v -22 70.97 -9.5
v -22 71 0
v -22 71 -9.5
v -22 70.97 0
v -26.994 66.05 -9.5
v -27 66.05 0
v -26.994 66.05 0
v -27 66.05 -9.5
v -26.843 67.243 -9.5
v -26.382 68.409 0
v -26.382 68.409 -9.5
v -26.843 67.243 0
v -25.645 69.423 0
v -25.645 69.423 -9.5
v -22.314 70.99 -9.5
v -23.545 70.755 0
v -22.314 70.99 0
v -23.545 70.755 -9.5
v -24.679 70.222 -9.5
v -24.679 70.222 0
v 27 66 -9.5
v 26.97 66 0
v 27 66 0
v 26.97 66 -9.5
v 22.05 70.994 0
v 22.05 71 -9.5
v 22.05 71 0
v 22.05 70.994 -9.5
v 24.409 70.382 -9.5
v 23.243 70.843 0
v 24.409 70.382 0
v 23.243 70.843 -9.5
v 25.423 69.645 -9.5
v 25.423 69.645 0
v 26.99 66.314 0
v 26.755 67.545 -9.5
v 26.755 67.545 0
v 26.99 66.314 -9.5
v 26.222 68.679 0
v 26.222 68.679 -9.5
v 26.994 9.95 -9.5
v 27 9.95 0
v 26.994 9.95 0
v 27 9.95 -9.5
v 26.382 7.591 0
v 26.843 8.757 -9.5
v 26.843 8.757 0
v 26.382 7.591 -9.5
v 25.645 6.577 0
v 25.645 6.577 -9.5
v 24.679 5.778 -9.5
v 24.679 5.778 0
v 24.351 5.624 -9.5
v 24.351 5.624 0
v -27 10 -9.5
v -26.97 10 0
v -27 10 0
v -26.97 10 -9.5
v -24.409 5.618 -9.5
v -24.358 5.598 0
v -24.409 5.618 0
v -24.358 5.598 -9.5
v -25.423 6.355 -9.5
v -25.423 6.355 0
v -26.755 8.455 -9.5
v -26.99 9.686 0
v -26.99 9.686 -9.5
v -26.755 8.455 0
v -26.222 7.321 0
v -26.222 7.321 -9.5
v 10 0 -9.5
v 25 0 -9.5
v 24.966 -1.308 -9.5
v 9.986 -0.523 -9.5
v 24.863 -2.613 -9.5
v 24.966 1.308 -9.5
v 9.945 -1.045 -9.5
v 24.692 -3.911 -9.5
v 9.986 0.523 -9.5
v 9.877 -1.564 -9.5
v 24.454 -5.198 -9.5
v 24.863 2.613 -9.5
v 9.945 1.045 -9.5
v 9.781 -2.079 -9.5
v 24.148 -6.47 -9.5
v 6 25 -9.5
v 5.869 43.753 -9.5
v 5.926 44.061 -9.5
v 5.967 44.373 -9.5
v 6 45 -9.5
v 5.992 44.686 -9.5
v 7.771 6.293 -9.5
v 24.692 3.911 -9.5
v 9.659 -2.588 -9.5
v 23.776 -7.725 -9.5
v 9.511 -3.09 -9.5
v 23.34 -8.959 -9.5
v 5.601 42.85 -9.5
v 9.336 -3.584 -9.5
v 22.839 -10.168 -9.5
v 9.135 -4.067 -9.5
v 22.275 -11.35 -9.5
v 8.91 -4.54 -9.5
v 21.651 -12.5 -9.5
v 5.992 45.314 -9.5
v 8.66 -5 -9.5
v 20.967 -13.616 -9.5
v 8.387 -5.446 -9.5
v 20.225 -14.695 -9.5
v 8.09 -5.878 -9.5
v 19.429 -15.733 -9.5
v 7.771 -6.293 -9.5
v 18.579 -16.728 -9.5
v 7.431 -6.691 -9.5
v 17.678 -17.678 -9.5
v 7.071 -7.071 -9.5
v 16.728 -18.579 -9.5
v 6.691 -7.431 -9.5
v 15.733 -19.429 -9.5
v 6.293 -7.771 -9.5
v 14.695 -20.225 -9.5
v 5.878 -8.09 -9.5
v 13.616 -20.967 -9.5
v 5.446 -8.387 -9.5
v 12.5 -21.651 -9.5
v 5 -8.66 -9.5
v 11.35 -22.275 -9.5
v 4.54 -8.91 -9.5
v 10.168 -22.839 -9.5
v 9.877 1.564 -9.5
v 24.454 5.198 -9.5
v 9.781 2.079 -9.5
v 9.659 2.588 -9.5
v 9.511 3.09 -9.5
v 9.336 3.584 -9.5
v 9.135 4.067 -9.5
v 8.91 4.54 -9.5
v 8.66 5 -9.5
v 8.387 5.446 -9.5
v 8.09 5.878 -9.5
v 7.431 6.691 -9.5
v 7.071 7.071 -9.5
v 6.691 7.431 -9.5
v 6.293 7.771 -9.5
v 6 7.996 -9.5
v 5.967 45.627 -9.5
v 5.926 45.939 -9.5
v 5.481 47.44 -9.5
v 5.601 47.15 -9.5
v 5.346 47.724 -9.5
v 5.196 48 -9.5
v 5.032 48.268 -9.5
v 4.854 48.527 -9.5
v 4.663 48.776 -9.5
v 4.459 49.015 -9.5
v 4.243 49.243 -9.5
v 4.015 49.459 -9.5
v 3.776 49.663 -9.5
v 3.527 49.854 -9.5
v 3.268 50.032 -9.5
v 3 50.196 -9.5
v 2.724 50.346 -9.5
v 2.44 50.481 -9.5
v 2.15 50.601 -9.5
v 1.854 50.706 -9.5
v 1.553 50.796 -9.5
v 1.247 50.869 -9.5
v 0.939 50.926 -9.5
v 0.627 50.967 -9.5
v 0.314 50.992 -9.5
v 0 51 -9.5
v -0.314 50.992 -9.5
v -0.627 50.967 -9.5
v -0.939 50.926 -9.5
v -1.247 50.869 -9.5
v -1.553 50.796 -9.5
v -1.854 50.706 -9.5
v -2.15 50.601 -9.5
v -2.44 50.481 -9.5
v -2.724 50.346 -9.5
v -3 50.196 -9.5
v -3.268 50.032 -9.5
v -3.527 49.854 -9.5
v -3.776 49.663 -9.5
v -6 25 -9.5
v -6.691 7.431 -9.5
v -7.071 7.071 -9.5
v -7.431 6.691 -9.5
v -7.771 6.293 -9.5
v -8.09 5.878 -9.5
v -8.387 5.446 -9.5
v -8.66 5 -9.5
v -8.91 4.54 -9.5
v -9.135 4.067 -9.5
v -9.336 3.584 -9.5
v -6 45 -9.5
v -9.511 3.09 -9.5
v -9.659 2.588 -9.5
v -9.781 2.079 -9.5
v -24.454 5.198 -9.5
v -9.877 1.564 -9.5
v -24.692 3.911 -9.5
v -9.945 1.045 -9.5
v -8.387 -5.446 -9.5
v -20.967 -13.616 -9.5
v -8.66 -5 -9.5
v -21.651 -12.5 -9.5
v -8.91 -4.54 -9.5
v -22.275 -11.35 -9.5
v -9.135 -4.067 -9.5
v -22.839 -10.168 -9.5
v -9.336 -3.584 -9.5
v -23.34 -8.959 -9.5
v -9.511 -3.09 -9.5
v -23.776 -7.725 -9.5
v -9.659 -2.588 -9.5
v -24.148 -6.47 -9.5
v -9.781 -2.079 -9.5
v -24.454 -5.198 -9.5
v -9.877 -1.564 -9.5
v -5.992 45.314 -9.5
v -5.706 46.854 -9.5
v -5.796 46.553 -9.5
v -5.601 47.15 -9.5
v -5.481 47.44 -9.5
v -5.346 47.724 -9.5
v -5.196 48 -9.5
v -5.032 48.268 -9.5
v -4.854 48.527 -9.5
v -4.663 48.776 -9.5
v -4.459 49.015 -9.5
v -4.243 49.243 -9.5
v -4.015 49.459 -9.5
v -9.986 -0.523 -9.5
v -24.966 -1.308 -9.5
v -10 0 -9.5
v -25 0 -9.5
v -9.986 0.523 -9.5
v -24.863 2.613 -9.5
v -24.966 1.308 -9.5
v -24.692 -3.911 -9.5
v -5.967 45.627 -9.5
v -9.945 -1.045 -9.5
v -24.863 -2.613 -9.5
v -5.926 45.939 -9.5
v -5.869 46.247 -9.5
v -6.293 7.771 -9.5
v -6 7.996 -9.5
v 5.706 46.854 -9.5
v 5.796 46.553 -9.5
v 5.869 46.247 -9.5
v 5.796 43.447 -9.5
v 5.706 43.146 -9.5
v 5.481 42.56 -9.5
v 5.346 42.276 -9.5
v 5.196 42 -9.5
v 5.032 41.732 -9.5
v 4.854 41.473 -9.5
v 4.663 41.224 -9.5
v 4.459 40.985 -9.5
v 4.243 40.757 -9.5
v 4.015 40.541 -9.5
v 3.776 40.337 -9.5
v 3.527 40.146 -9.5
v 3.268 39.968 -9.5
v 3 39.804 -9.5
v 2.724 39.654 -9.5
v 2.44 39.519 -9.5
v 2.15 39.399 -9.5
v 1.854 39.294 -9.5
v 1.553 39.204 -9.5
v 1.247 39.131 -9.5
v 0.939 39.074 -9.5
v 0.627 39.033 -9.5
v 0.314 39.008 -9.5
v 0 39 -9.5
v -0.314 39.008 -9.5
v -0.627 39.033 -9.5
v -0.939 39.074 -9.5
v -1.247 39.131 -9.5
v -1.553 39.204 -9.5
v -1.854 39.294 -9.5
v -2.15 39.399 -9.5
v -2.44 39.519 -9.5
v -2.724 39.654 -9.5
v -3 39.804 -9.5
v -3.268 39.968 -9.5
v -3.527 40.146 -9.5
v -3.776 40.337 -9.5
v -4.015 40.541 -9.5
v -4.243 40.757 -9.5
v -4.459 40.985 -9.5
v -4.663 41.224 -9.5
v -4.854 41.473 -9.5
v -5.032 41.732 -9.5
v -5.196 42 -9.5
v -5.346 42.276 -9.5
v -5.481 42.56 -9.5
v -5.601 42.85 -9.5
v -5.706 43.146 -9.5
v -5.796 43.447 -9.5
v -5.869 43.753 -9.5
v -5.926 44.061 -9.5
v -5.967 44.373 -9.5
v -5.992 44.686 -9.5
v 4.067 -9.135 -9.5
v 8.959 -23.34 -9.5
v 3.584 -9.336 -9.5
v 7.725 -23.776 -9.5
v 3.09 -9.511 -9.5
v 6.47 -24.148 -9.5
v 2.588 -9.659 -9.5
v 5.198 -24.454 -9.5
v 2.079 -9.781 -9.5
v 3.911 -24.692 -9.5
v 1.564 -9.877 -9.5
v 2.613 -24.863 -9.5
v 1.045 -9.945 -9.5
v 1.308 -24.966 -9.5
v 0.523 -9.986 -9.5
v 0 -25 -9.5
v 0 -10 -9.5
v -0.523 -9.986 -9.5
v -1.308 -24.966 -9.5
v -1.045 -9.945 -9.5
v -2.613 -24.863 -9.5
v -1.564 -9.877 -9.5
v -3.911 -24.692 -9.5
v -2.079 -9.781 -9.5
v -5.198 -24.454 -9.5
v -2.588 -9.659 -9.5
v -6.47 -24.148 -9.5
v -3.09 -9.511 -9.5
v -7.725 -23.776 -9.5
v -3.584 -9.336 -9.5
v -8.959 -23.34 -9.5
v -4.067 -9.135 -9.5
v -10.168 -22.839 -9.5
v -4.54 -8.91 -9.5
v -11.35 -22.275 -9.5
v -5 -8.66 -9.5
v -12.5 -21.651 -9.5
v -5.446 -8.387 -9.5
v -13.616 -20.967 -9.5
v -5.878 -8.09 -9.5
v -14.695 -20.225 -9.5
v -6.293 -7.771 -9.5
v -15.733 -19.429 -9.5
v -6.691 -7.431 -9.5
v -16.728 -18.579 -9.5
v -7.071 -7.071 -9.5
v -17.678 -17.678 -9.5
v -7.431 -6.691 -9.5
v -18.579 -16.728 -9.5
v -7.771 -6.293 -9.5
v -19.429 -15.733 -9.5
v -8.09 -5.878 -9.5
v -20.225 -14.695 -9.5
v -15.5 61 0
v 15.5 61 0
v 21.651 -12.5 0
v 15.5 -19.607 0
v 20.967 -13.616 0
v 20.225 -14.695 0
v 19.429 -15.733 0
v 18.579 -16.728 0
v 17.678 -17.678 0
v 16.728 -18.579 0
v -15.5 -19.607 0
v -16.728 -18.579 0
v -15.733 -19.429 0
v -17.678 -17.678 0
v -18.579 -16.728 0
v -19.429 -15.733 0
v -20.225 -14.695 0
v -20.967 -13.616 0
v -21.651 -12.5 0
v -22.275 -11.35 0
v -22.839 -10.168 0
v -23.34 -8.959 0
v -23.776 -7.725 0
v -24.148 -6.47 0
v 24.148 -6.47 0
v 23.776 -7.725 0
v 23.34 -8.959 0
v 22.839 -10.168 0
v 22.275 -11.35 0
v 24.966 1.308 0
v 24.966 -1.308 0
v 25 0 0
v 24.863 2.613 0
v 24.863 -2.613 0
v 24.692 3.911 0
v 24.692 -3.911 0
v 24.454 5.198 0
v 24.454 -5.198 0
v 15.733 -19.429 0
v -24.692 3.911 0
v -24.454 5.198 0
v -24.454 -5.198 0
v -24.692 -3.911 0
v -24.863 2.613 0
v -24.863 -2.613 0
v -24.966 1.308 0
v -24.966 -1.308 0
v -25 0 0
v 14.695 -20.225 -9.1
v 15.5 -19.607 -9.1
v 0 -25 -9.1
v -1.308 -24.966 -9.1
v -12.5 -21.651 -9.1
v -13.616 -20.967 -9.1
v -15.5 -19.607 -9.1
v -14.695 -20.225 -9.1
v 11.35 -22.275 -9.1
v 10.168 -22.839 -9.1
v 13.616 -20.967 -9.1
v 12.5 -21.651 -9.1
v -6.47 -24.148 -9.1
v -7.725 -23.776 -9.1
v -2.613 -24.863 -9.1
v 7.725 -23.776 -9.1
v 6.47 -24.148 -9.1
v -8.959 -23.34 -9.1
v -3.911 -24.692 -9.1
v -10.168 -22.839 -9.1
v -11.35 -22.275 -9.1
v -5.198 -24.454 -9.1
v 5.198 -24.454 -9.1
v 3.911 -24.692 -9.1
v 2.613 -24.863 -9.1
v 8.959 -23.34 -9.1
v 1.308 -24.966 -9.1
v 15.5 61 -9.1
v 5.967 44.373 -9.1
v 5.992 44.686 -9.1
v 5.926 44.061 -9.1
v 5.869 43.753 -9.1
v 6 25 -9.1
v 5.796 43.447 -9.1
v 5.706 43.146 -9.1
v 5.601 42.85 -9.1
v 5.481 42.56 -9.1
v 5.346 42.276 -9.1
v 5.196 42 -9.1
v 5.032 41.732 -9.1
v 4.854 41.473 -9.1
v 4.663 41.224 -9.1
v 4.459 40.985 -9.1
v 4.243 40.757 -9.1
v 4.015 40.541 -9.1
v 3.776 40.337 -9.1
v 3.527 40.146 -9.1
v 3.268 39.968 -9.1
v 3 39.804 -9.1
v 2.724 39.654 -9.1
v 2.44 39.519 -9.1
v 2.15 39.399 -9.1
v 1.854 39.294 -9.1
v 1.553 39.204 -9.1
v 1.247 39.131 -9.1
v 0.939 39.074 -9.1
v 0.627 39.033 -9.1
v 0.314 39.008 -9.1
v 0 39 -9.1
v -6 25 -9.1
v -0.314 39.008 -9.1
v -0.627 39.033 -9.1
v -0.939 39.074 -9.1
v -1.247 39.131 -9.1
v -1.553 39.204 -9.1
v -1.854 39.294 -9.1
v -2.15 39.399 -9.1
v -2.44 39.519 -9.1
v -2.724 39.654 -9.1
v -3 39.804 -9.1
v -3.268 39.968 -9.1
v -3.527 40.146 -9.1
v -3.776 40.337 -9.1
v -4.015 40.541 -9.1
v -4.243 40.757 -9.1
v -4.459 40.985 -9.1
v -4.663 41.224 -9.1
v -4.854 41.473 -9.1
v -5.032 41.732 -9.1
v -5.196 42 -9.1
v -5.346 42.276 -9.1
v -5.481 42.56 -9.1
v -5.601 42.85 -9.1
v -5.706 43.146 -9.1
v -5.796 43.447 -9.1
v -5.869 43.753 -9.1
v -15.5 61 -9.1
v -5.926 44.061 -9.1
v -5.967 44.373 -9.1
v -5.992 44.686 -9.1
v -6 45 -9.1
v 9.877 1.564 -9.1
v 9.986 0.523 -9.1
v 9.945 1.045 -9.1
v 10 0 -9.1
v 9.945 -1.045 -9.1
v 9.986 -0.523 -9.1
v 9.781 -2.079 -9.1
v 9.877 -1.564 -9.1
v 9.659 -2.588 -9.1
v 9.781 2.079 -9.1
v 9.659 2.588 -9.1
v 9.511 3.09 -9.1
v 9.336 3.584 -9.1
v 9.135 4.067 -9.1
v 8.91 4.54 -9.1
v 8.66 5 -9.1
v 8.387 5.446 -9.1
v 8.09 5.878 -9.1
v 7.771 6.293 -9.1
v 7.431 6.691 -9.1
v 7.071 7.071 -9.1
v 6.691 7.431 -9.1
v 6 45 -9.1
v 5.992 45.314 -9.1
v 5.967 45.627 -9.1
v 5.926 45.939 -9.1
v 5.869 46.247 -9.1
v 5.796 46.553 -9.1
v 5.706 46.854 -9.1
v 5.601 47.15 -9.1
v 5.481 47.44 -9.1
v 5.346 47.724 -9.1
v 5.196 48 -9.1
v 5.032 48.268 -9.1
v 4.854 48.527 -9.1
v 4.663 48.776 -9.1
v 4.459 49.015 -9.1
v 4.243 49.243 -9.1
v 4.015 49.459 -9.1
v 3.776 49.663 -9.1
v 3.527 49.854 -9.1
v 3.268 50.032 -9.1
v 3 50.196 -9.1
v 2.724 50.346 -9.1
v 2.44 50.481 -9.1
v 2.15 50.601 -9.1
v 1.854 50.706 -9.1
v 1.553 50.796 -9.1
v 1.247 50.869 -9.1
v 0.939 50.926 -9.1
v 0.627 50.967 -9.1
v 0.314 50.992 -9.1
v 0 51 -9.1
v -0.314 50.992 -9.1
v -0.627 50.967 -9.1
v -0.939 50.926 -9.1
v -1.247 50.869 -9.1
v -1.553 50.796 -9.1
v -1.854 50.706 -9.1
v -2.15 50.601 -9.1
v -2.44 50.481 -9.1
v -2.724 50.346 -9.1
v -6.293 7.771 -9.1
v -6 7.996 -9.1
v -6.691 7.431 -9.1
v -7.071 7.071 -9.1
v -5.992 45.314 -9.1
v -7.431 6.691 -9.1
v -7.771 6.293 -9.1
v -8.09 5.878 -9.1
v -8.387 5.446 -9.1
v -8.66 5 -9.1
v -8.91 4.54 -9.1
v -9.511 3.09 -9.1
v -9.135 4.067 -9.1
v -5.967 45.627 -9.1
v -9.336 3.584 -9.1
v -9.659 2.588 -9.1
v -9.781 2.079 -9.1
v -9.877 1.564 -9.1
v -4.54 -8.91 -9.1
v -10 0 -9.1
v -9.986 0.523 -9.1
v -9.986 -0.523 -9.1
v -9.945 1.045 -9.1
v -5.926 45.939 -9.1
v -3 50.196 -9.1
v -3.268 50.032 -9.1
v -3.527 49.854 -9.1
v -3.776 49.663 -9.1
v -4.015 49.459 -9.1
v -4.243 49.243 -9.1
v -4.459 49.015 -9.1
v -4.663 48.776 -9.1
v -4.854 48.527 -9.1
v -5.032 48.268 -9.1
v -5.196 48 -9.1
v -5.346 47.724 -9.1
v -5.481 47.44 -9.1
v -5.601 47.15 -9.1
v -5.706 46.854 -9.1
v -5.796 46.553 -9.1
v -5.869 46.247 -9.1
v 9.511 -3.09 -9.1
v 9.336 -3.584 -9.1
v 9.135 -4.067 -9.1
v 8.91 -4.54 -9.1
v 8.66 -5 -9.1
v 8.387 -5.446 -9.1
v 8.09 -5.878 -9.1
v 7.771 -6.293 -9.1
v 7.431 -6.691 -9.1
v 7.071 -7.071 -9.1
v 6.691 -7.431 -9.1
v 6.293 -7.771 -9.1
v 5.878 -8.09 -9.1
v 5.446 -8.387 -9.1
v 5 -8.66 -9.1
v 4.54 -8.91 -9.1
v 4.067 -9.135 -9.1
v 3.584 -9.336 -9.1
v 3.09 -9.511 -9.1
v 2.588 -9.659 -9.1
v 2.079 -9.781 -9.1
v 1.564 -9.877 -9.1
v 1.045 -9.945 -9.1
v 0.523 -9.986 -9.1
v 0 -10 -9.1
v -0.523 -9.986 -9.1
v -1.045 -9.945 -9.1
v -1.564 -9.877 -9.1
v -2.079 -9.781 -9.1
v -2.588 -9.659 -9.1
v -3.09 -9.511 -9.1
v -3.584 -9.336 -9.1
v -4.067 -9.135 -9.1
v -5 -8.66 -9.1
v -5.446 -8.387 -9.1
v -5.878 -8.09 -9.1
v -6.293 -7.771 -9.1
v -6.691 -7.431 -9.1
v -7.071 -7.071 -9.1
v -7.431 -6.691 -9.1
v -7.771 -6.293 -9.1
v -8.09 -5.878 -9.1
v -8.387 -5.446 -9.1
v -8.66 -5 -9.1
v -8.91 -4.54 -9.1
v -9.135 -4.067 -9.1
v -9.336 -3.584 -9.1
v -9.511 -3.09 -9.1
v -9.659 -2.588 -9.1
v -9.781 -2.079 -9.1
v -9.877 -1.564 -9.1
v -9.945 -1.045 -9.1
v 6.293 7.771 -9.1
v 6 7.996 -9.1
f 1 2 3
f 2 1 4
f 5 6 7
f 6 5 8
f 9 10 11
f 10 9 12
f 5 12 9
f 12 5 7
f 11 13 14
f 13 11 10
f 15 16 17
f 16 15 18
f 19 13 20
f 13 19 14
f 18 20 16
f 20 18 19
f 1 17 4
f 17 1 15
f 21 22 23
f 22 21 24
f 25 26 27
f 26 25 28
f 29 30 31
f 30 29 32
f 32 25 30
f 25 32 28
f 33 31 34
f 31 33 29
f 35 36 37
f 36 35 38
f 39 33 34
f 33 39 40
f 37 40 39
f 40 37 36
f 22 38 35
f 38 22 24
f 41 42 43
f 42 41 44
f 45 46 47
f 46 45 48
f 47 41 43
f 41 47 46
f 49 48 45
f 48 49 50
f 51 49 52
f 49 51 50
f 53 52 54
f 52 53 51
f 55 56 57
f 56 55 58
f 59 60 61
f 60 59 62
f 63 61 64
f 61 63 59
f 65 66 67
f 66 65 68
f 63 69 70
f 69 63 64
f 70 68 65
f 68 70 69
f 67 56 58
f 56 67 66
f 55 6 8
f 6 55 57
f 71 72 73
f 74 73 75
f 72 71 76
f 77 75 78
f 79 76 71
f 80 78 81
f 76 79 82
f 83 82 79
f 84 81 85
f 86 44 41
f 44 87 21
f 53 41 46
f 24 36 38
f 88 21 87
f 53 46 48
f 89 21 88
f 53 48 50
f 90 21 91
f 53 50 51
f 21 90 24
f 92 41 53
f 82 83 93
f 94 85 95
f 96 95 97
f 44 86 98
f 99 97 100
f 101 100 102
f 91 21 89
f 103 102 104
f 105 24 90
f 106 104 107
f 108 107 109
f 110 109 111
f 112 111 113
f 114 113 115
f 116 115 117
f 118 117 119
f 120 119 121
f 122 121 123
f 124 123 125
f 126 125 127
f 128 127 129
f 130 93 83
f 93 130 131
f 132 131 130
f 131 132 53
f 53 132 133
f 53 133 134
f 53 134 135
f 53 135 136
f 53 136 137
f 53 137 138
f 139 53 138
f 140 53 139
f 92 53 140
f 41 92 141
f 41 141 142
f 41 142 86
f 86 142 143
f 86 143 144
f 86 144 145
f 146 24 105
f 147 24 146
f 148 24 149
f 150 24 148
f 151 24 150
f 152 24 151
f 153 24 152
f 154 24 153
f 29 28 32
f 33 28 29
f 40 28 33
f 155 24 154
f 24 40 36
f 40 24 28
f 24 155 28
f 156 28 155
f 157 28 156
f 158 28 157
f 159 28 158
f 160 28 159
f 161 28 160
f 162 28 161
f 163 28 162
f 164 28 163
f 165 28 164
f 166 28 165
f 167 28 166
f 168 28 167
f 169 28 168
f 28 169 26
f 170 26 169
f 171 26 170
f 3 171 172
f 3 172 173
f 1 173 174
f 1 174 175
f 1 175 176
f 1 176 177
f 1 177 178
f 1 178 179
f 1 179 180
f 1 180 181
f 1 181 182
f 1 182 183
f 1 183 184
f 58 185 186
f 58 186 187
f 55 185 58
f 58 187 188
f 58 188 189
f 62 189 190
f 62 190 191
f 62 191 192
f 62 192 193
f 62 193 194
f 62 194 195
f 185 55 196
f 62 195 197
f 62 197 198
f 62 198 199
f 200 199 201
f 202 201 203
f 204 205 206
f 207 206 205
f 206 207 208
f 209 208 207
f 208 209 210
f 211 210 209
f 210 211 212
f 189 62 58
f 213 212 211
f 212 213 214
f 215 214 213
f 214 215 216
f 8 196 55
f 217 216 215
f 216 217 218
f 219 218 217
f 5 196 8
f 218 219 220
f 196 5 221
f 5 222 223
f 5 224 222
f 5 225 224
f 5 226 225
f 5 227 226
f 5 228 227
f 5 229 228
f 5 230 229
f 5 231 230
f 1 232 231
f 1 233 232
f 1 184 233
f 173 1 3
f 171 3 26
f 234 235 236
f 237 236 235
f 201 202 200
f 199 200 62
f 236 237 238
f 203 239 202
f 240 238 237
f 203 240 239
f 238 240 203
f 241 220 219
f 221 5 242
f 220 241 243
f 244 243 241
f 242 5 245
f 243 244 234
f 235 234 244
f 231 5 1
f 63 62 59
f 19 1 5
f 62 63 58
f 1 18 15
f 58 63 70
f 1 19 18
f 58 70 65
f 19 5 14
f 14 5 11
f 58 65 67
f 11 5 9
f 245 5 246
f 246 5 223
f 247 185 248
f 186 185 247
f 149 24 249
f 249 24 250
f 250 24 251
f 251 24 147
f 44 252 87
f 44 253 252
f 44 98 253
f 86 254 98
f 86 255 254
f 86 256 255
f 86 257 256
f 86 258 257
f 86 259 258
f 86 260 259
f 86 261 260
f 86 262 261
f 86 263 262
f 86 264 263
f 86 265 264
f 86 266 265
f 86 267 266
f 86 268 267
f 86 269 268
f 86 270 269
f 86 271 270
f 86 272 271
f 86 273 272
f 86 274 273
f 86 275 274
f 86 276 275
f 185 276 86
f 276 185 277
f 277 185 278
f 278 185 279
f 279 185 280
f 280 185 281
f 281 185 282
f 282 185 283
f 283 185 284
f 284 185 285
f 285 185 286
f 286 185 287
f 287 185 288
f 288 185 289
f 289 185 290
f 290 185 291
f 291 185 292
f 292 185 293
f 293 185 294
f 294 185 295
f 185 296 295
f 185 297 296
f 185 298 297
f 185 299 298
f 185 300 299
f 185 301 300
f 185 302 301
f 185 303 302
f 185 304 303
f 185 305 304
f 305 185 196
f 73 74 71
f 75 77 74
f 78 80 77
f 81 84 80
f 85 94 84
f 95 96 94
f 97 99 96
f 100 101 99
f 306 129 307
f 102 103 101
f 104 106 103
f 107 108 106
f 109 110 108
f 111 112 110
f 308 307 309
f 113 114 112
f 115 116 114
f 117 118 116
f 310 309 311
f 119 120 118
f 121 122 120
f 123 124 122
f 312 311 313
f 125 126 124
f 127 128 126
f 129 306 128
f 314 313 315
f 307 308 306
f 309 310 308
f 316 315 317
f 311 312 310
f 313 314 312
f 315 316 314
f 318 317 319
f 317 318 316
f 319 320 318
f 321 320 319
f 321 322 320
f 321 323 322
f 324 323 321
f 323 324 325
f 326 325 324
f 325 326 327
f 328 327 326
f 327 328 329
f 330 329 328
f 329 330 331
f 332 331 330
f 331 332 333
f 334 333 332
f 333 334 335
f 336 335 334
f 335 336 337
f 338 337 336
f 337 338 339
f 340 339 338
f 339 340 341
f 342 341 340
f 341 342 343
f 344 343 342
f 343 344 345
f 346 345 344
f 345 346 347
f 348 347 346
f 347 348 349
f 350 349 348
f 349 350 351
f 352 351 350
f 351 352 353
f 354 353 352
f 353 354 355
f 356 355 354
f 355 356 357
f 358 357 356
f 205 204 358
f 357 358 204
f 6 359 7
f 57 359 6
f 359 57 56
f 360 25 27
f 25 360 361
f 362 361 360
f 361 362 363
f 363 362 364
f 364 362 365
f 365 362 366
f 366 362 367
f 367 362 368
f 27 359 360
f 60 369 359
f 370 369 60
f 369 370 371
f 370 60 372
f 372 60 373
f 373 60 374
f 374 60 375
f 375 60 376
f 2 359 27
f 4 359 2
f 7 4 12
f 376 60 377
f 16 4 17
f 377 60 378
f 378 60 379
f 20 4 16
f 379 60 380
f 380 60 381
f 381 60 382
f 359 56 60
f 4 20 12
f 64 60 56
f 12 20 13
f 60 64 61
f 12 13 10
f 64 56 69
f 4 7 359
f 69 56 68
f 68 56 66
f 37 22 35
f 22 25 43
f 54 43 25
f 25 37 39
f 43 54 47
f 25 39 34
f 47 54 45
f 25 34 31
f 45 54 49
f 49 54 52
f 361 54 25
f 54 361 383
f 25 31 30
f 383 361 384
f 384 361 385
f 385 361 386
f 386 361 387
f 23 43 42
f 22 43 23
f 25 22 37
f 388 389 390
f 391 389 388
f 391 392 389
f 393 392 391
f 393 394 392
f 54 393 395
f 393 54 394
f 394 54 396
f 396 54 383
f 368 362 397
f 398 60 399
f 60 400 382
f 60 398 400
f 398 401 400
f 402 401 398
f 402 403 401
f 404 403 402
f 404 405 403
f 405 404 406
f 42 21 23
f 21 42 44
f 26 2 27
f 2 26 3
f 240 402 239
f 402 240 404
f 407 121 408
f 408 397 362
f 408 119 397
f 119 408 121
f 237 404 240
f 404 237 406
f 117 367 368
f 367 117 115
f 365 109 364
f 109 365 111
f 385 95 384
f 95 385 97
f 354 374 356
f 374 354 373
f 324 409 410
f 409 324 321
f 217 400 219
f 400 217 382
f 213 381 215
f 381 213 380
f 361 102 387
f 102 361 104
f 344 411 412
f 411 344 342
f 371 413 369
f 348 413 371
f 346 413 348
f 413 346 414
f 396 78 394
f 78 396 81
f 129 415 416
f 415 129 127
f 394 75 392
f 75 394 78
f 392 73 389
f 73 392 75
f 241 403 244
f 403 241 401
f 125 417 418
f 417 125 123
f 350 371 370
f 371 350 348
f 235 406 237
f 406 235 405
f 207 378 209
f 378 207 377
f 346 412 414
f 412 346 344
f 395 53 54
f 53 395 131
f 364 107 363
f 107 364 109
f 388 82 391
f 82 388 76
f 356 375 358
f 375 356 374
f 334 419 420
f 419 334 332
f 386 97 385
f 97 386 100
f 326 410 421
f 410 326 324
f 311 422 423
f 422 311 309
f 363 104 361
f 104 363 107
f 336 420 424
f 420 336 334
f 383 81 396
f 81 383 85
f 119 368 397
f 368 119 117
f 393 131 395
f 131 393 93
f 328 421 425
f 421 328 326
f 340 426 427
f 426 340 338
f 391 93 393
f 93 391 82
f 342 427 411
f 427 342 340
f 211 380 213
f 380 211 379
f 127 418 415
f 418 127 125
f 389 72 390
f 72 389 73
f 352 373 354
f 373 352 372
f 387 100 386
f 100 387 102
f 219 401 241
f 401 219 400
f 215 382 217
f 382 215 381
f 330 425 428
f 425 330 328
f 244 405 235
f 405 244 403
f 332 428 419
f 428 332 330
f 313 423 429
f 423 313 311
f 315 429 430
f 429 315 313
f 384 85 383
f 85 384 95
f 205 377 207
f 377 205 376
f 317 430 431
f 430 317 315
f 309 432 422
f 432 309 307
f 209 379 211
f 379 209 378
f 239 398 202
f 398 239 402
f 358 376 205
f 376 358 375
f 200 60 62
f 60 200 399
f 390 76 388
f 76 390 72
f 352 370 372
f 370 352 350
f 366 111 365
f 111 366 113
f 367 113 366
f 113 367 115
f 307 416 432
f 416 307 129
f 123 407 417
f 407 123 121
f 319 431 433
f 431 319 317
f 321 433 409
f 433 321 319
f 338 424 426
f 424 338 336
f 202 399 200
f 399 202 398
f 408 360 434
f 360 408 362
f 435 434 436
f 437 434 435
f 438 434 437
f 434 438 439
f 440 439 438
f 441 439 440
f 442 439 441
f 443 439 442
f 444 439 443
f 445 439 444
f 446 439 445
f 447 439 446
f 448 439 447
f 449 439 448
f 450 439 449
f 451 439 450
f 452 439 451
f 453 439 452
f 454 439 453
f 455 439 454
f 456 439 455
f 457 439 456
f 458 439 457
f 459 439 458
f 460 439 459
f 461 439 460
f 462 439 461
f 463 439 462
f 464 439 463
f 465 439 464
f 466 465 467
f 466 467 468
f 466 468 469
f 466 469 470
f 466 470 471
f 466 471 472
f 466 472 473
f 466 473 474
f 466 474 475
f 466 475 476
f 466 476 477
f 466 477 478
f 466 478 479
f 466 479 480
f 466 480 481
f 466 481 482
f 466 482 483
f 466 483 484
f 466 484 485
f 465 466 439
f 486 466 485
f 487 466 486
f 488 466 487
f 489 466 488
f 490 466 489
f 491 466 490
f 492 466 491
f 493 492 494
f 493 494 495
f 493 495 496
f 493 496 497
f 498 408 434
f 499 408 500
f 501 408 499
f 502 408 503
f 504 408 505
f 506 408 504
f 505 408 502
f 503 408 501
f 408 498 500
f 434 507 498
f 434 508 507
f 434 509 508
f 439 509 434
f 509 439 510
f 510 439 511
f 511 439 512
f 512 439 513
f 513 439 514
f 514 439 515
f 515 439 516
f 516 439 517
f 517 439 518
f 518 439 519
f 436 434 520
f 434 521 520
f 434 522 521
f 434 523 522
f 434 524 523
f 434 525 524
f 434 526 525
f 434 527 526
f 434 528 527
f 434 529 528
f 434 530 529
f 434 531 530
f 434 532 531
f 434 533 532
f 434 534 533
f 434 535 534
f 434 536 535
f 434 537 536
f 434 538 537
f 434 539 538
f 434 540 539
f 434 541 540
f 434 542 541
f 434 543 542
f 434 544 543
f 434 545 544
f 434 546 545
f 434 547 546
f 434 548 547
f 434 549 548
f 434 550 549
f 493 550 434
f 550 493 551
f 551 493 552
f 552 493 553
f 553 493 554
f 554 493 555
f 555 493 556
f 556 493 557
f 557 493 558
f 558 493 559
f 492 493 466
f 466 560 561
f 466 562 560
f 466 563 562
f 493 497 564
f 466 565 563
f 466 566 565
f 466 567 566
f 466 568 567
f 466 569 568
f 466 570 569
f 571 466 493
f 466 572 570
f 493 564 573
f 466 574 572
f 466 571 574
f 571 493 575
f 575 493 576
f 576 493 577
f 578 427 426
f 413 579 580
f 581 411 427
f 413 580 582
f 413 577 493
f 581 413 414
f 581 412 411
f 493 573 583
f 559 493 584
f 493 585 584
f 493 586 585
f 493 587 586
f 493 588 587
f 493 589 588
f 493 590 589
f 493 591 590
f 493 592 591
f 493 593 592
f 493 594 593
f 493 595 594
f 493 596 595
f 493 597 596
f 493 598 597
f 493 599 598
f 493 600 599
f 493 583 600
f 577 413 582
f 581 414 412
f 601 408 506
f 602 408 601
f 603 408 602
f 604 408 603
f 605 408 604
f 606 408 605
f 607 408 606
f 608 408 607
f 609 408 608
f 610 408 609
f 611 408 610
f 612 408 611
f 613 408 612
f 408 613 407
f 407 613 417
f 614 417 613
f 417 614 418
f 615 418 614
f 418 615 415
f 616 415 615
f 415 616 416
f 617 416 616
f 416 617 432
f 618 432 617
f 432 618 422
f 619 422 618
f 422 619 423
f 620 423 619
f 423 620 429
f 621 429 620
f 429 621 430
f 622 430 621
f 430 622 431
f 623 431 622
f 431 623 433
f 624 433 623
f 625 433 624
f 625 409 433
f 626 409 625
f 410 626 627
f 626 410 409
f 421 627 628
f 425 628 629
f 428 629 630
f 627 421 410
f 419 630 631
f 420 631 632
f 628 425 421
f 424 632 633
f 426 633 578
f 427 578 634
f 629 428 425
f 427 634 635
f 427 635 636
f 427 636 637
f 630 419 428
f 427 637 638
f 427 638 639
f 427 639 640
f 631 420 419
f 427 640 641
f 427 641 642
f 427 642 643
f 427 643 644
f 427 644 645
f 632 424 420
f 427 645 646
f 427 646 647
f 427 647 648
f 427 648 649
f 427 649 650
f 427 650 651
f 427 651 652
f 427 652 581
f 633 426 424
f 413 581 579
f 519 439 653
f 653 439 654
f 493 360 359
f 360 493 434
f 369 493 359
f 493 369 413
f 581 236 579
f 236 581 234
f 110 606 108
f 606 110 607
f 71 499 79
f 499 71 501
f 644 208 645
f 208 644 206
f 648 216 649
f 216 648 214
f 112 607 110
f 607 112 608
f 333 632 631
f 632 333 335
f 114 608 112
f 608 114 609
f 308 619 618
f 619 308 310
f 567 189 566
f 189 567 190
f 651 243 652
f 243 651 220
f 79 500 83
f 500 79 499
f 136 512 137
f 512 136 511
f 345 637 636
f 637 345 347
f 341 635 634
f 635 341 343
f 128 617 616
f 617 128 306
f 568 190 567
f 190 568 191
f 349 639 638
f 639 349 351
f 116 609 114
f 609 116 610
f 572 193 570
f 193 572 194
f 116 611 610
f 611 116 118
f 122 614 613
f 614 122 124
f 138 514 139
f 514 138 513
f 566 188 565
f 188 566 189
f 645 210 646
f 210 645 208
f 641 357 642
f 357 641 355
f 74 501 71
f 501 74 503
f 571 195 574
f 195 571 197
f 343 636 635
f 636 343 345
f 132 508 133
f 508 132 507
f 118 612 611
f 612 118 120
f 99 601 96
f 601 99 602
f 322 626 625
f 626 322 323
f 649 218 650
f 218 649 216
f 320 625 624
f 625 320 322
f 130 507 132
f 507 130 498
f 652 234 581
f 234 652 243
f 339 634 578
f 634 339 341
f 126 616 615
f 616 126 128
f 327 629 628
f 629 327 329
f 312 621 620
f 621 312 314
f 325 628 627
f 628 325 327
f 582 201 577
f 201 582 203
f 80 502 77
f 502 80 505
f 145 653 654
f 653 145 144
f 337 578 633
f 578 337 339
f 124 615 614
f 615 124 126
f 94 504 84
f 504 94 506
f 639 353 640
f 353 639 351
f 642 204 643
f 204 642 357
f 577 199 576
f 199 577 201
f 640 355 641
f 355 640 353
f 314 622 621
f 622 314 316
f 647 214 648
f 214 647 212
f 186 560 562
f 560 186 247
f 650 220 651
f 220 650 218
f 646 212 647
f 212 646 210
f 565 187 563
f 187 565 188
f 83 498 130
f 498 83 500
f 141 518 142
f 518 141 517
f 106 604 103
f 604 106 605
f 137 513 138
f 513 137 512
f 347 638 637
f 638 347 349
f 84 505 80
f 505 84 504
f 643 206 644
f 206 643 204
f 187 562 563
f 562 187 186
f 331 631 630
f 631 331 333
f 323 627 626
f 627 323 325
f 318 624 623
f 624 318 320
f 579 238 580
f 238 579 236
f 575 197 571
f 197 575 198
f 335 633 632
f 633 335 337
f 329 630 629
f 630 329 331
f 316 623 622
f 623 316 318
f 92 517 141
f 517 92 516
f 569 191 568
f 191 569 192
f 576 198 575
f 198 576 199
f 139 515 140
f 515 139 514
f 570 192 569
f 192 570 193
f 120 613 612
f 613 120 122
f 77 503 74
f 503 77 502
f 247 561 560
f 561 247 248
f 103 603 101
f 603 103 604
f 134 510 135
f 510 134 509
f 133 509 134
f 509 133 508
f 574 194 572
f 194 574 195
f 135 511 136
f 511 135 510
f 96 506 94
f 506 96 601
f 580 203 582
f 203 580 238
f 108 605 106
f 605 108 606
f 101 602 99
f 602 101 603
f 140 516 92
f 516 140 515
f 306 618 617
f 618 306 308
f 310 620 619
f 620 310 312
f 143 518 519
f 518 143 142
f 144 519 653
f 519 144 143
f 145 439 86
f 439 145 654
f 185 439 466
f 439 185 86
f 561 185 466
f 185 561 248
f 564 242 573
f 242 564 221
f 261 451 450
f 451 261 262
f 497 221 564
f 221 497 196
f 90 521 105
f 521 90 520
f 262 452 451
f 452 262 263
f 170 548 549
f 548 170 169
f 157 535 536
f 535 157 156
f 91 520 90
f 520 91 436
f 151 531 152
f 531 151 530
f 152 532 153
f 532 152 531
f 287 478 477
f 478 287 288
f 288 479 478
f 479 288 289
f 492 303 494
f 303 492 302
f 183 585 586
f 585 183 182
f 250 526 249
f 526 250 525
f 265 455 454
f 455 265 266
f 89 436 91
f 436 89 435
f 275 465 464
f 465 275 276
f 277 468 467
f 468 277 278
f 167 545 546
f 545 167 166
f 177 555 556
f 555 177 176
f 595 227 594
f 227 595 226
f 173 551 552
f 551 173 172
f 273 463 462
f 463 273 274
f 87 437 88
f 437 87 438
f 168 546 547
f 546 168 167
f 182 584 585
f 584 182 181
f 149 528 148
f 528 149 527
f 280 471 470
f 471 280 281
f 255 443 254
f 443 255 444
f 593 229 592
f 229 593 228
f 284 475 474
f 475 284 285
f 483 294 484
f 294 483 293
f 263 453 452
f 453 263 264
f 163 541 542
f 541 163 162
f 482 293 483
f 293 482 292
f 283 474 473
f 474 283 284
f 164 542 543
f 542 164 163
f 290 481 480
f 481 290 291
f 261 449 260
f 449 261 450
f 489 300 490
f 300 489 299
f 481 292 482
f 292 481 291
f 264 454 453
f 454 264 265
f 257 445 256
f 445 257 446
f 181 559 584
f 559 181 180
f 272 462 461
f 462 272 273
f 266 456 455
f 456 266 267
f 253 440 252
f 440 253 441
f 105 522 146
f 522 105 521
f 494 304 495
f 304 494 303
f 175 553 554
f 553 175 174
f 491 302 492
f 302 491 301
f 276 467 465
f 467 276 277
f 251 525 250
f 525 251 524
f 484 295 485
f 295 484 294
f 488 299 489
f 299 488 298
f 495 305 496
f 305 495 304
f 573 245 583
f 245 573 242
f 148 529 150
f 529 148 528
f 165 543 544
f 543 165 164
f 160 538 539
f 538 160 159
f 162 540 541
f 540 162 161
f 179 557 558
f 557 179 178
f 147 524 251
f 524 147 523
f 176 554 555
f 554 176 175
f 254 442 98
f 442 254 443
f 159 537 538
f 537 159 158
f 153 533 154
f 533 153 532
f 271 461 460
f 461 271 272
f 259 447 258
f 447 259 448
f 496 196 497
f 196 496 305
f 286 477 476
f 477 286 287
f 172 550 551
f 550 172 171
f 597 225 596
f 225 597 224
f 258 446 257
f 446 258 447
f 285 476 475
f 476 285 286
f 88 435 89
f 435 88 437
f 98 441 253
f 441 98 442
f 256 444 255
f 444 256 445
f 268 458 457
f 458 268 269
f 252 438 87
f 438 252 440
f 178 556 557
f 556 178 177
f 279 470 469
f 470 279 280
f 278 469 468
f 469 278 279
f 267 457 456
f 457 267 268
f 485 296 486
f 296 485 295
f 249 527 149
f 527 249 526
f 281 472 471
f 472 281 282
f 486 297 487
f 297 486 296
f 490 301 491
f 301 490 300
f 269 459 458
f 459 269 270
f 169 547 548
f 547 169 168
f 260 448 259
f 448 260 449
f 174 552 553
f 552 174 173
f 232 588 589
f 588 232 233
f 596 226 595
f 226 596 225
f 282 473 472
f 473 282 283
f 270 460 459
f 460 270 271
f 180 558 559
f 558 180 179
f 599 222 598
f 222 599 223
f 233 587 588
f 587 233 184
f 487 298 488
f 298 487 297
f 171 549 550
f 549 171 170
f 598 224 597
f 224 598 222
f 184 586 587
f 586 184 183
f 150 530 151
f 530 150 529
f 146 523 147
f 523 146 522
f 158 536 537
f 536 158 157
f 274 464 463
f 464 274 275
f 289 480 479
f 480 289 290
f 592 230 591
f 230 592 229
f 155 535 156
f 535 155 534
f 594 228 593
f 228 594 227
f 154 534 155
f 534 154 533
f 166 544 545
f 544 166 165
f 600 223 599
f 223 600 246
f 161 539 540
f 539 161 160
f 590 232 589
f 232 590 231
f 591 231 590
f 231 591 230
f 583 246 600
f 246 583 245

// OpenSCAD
/*
Copyright (C) 2016 Wolf Ruedi Christen
This program is free software: you can redistribute it and/or modify it under the terms of the GNU General Public License as published by the Free Software Foundation, either version 3 of the License, or (at your option) any later version.
This program is distributed in the hope that it will be useful, but WITHOUT ANY WARRANTY; without even the implied warranty of MERCHANTABILITY or FITNESS FOR A PARTICULAR PURPOSE. See the GNU General Public License for more details. You should have received a copy of the GNU General Public License along with this program. If not, see <http://www.gnu.org/licenses/>.

    ------------------------------------------------------------
    
    Designed for: Nuki - Smart Doorlock: http://nuki.io
    
    I needed a support for the adhesive B-plate: the width
    of less than 30mm wasn't enough to hold my Nuki in place.

    Contact: wolf+nuki-bplate@urspace.ch
    
    ------------------------------------------------------------
    
    Thanks to Sergio Vilches for the roundCornersCube()-function
*/

// Don't generate smaller facets than these mm
$fs = 0.1;  
// Don't generate larger angles than these degrees
$fa = 3;    

// use rounded outer-borders (1) or not (0)
rounded = 1;
// depth or thickness: usually thickness of the doorplate + cutout_depth_offset (mm)
depth = 9.5;
// given by B-plate diameter (mm)
head_radius = 25;
// given by B-plate width (mm)
body_width = 54;
// measured from keyhole-center + 5 (mm)
body_length = 66;
// inner-cutout-width: given by the doorplate-width (mm)
cutout_width = 31;
// given by the doorplate-length: measured from keyhole-center (mm)
cutout_length = 61;
// 0.4 mm (or at least 2 layers) seems a good value (mm)
cutout_depth_offset = 0.4;
// additional screwhole: set to 0 to remove (mm)
screwhole_diameter = 12;
// screwhole offset: measured from keyhole-center (mm)
screwhole_distance = 45;

rotate([0,180,0]) difference () {
    union () {
        // circle
        linear_extrude(depth) circle(head_radius);
        // body
        if (rounded==1) {
        translate([0,body_length/2+5,depth/2]) roundCornersCube(body_width,body_length,depth,5); // rounded-version
        } else {
            translate([0,body_length/2+2.5,0]) linear_extrude(depth) square([body_width,body_length+5],center=true); // edged-version
        }
    }
    // cutout
    translate([0,cutout_length/2-head_radius/2,-0.1]) linear_extrude(depth-cutout_depth_offset+0.1) square([cutout_width,cutout_length+head_radius],center=true);
    // cylindercase-hole
    linear_extrude(depth+1) circle(10);
    translate([0,12.5,0]) linear_extrude(depth+1) square([12,25],center=true);
    // screwhole
    translate([0,screwhole_distance,0]) linear_extrude(depth+1) circle(screwhole_diameter/2);
}
            


/*
http://codeviewer.org/view/code:1b36 
Copyright (C) 2011 Sergio Vilches
This program is free software: you can redistribute it and/or modify it under the terms of the GNU General Public License as published by the Free Software Foundation, either version 3 of the License, or (at your option) any later version.
This program is distributed in the hope that it will be useful, but WITHOUT ANY WARRANTY; without even the implied warranty of MERCHANTABILITY or FITNESS FOR A PARTICULAR PURPOSE. See the GNU General Public License for more details. You should have received a copy of the GNU General Public License along with this program. If not, see <http://www.gnu.org/licenses/>.
Contact: s.vilches.e@gmail.com


    ----------------------------------------------------------- 
                 Round Corners Cube (Extruded)                
      roundCornersCube(x,y,z,r) Where:                        
         - x = Xdir width                                     
         - y = Ydir width                                     
         - z = Height of the cube                             
         - r = Rounding radious                               
                                                              
      Example: roundCornerCube(10,10,2,1);                    
     *Some times it's needed to use F6 to see good results!   
 	 ----------------------------------------------------------- 
*/
// Test it!
// roundCornersCube(10,5,2,1);


module createMeniscus(h,radius) // This module creates the shape that needs to be substracted from a cube to make its corners rounded.
difference(){        //This shape is basicly the difference between a quarter of cylinder and a cube
   translate([radius/2+0.1,radius/2+0.1,0]){
      cube([radius+0.2,radius+0.1,h+0.2],center=true);         // All that 0.x numbers are to avoid "ghost boundaries" when substracting
   }

   cylinder(h=h+0.2,r=radius,$fn = 25,center=true);
}


module roundCornersCube(x,y,z,r)  // Now we just substract the shape we have created in the four corners
difference(){
   cube([x,y,z], center=true);

translate([x/2-r,y/2-r]){  // We move to the first corner (x,y)
      rotate(0){  
         createMeniscus(z,r); // And substract the meniscus
      }
   }
   translate([-x/2+r,y/2-r]){ // To the second corner (-x,y)
      rotate(90){
         createMeniscus(z,r); // But this time we have to rotate the meniscus 90 deg
      }
   }
      translate([-x/2+r,-y/2+r]){ // ... 
      rotate(180){
         createMeniscus(z,r);
      }
   }
      translate([x/2-r,-y/2+r]){
      rotate(270){
         createMeniscus(z,r);
      }
   }
}





